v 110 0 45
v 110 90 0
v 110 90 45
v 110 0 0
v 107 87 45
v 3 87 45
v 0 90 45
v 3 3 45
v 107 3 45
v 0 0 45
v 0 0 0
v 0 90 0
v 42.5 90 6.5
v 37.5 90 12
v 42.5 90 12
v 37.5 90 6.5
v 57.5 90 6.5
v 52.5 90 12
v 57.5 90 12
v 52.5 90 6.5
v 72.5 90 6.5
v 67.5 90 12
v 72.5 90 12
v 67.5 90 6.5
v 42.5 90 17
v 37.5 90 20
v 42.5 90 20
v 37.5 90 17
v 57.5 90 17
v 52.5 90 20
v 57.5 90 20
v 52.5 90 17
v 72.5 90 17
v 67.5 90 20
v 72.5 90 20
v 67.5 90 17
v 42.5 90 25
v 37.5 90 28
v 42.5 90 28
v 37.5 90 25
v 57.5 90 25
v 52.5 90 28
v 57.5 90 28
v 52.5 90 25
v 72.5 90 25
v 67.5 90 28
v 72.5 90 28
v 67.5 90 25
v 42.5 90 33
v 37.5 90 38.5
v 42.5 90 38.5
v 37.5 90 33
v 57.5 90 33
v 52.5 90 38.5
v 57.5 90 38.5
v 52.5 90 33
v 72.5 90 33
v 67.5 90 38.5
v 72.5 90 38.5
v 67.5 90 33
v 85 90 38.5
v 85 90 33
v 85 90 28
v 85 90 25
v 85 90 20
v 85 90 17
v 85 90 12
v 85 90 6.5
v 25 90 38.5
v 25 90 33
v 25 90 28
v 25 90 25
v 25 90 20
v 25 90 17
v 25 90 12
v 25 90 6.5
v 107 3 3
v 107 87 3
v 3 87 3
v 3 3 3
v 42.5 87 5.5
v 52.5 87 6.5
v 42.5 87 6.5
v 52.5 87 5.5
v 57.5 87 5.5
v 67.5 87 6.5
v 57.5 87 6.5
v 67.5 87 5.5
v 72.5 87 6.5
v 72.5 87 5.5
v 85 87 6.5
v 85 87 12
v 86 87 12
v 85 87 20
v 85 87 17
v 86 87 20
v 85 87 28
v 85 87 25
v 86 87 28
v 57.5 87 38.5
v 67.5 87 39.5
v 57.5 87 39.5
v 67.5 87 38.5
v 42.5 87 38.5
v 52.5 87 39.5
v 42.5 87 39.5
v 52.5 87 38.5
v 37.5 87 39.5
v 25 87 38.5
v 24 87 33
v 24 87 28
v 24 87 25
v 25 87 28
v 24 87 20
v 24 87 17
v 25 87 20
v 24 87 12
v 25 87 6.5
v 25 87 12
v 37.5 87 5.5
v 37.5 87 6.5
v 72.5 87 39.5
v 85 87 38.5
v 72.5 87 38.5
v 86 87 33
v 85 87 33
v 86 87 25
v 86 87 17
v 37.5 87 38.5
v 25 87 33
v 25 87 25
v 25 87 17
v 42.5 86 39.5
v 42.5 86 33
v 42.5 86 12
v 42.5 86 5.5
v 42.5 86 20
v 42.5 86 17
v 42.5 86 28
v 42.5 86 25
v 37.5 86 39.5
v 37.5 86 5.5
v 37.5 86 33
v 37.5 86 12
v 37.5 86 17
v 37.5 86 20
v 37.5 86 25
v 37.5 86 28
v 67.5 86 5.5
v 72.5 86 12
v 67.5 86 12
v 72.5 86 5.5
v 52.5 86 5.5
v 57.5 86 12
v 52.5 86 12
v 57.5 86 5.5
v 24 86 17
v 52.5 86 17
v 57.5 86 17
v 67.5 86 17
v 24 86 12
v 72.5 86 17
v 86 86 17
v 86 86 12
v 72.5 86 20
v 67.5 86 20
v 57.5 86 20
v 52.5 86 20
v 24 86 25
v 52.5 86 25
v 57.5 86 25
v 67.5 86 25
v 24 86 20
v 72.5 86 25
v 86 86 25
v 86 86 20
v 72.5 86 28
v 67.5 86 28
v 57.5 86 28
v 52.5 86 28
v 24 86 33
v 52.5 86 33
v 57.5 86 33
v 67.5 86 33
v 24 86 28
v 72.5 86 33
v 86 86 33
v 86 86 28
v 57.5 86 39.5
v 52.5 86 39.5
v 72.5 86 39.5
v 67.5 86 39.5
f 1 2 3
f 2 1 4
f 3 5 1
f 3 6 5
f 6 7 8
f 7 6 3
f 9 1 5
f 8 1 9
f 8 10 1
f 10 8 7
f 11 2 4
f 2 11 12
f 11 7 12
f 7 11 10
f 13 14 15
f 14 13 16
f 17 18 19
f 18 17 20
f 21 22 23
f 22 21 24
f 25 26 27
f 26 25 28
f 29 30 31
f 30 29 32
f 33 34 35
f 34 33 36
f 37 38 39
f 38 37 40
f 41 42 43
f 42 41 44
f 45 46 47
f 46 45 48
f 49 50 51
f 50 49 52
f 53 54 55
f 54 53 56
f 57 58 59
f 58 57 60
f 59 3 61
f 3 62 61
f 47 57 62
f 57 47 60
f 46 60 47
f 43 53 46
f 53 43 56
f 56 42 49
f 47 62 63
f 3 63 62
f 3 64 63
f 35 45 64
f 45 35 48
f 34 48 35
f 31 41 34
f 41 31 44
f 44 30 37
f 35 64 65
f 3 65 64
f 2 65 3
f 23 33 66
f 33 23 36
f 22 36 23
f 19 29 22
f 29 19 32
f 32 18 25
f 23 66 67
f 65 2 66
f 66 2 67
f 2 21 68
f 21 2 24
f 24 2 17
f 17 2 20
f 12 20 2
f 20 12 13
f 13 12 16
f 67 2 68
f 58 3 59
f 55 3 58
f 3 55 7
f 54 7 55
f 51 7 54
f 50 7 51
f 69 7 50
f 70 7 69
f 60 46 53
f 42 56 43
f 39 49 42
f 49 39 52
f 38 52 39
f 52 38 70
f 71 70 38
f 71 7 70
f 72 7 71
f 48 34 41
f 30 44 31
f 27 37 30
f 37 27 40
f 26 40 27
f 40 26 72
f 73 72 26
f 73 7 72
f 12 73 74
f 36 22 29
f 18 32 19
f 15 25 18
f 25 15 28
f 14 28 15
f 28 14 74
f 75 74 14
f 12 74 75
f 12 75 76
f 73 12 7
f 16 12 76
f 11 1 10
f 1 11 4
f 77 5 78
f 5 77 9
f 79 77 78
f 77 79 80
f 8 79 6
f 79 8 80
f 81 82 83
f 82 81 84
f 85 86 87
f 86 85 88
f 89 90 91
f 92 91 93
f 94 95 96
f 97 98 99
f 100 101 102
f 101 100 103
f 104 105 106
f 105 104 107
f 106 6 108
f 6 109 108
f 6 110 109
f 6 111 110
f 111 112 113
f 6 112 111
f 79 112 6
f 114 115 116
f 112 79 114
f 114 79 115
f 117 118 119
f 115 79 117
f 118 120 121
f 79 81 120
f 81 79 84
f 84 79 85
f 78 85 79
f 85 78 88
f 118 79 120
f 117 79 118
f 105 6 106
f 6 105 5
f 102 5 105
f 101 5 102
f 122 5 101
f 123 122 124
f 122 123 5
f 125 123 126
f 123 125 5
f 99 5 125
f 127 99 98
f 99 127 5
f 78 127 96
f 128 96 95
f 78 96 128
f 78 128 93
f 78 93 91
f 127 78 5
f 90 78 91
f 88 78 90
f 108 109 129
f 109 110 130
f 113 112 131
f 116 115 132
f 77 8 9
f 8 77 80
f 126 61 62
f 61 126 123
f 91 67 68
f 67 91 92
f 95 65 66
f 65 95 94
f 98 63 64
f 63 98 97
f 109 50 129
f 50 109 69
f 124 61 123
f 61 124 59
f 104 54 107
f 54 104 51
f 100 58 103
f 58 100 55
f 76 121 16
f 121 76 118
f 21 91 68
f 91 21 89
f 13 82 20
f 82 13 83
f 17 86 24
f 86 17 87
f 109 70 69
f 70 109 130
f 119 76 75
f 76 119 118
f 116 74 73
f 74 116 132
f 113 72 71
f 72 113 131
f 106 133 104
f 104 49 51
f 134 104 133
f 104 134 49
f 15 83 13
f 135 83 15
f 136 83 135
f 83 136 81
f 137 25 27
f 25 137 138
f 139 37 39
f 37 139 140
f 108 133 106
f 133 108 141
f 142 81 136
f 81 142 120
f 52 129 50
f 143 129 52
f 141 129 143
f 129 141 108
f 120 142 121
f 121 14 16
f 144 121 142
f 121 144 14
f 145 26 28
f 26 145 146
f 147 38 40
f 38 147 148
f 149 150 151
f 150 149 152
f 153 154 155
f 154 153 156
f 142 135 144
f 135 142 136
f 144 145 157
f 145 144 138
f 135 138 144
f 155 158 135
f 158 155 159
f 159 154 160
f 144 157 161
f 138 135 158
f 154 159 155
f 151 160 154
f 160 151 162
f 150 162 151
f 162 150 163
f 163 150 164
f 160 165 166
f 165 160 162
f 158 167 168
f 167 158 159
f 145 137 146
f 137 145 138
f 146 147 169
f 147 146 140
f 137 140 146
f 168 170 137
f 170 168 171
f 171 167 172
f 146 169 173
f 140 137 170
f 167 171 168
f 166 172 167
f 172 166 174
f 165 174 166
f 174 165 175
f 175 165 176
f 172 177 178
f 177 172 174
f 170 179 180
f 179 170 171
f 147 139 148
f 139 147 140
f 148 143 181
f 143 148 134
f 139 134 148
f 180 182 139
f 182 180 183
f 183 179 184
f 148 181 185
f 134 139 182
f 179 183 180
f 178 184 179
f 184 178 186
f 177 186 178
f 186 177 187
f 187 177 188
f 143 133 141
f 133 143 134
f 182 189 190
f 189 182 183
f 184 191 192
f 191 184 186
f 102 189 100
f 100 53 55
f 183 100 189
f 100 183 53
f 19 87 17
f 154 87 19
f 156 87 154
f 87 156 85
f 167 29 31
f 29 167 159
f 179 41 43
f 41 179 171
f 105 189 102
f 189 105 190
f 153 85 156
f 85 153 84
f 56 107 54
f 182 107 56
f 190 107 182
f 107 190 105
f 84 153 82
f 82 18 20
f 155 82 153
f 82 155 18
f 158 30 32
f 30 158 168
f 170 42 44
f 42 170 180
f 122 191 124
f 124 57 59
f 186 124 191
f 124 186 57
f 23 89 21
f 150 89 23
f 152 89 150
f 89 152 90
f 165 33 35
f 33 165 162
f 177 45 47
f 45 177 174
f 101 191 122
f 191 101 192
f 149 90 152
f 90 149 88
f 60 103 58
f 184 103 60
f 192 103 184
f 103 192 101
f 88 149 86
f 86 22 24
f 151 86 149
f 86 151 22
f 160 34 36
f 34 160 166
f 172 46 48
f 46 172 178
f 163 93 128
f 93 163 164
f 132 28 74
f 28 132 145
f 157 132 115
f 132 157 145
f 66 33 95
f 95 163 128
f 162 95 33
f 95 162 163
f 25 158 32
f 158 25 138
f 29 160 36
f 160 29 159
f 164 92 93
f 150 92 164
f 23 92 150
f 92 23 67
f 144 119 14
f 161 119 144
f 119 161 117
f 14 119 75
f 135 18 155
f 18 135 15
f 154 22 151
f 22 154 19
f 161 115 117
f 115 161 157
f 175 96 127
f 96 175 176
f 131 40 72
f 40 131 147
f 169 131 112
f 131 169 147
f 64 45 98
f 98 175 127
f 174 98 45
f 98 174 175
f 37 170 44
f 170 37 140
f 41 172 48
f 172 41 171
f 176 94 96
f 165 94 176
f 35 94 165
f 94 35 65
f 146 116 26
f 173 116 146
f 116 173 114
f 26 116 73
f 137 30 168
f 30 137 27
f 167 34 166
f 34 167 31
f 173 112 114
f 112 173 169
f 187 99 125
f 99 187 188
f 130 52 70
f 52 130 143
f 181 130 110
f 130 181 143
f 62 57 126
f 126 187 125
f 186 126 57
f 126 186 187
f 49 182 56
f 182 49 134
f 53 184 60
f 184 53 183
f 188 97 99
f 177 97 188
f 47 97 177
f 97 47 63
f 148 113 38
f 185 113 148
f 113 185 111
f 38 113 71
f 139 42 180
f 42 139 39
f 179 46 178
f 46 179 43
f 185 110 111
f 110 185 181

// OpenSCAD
$fn = 32;

// ----------------------------------------------------------------------
// Vent box: crossgrid enclosure
// ----------------------------------------------------------------------

// --- parameters (mm) ---
box_l = 110;              // box length, X
box_w = 90;               // box width, Y
box_h = 45;               // box height, Z
wall_t = 3;               // shell wall thickness
win_l = 60;               // vent window width, X
win_h = 32;               // vent window height, Z
bar_w = 5;                // grid bar width
n_v = 3;                  // vertical bar count
n_h = 3;                  // horizontal bar count

win_z0 = (box_h - win_h) / 2;  // window lower edge Z
v_step = win_l / (n_v + 1);  // vertical bar step
h_step = win_h / (n_h + 1);  // horizontal bar step

difference() {
  union() {
    difference() {
      cube([box_l, box_w, box_h]);
  translate([wall_t, wall_t, wall_t])
    cube([box_l - 2 * wall_t, box_w - 2 * wall_t, box_h]);
  translate([(box_l - win_l) / 2, box_w - wall_t - 1, win_z0])
    cube([win_l, wall_t + 2, win_h]);
    }
    for (i = [1 : n_v])
      translate([(box_l - win_l) / 2 + i * v_step - bar_w / 2,
                 box_w - wall_t - 1, win_z0 - 1])
        cube([bar_w, wall_t + 1, win_h + 2]);
    for (i = [1 : n_h])
      translate([(box_l - win_l) / 2 - 1, box_w - wall_t - 1,
                 win_z0 + i * h_step - bar_w / 2])
        cube([win_l + 2, wall_t + 1, bar_w]);
  }
}
